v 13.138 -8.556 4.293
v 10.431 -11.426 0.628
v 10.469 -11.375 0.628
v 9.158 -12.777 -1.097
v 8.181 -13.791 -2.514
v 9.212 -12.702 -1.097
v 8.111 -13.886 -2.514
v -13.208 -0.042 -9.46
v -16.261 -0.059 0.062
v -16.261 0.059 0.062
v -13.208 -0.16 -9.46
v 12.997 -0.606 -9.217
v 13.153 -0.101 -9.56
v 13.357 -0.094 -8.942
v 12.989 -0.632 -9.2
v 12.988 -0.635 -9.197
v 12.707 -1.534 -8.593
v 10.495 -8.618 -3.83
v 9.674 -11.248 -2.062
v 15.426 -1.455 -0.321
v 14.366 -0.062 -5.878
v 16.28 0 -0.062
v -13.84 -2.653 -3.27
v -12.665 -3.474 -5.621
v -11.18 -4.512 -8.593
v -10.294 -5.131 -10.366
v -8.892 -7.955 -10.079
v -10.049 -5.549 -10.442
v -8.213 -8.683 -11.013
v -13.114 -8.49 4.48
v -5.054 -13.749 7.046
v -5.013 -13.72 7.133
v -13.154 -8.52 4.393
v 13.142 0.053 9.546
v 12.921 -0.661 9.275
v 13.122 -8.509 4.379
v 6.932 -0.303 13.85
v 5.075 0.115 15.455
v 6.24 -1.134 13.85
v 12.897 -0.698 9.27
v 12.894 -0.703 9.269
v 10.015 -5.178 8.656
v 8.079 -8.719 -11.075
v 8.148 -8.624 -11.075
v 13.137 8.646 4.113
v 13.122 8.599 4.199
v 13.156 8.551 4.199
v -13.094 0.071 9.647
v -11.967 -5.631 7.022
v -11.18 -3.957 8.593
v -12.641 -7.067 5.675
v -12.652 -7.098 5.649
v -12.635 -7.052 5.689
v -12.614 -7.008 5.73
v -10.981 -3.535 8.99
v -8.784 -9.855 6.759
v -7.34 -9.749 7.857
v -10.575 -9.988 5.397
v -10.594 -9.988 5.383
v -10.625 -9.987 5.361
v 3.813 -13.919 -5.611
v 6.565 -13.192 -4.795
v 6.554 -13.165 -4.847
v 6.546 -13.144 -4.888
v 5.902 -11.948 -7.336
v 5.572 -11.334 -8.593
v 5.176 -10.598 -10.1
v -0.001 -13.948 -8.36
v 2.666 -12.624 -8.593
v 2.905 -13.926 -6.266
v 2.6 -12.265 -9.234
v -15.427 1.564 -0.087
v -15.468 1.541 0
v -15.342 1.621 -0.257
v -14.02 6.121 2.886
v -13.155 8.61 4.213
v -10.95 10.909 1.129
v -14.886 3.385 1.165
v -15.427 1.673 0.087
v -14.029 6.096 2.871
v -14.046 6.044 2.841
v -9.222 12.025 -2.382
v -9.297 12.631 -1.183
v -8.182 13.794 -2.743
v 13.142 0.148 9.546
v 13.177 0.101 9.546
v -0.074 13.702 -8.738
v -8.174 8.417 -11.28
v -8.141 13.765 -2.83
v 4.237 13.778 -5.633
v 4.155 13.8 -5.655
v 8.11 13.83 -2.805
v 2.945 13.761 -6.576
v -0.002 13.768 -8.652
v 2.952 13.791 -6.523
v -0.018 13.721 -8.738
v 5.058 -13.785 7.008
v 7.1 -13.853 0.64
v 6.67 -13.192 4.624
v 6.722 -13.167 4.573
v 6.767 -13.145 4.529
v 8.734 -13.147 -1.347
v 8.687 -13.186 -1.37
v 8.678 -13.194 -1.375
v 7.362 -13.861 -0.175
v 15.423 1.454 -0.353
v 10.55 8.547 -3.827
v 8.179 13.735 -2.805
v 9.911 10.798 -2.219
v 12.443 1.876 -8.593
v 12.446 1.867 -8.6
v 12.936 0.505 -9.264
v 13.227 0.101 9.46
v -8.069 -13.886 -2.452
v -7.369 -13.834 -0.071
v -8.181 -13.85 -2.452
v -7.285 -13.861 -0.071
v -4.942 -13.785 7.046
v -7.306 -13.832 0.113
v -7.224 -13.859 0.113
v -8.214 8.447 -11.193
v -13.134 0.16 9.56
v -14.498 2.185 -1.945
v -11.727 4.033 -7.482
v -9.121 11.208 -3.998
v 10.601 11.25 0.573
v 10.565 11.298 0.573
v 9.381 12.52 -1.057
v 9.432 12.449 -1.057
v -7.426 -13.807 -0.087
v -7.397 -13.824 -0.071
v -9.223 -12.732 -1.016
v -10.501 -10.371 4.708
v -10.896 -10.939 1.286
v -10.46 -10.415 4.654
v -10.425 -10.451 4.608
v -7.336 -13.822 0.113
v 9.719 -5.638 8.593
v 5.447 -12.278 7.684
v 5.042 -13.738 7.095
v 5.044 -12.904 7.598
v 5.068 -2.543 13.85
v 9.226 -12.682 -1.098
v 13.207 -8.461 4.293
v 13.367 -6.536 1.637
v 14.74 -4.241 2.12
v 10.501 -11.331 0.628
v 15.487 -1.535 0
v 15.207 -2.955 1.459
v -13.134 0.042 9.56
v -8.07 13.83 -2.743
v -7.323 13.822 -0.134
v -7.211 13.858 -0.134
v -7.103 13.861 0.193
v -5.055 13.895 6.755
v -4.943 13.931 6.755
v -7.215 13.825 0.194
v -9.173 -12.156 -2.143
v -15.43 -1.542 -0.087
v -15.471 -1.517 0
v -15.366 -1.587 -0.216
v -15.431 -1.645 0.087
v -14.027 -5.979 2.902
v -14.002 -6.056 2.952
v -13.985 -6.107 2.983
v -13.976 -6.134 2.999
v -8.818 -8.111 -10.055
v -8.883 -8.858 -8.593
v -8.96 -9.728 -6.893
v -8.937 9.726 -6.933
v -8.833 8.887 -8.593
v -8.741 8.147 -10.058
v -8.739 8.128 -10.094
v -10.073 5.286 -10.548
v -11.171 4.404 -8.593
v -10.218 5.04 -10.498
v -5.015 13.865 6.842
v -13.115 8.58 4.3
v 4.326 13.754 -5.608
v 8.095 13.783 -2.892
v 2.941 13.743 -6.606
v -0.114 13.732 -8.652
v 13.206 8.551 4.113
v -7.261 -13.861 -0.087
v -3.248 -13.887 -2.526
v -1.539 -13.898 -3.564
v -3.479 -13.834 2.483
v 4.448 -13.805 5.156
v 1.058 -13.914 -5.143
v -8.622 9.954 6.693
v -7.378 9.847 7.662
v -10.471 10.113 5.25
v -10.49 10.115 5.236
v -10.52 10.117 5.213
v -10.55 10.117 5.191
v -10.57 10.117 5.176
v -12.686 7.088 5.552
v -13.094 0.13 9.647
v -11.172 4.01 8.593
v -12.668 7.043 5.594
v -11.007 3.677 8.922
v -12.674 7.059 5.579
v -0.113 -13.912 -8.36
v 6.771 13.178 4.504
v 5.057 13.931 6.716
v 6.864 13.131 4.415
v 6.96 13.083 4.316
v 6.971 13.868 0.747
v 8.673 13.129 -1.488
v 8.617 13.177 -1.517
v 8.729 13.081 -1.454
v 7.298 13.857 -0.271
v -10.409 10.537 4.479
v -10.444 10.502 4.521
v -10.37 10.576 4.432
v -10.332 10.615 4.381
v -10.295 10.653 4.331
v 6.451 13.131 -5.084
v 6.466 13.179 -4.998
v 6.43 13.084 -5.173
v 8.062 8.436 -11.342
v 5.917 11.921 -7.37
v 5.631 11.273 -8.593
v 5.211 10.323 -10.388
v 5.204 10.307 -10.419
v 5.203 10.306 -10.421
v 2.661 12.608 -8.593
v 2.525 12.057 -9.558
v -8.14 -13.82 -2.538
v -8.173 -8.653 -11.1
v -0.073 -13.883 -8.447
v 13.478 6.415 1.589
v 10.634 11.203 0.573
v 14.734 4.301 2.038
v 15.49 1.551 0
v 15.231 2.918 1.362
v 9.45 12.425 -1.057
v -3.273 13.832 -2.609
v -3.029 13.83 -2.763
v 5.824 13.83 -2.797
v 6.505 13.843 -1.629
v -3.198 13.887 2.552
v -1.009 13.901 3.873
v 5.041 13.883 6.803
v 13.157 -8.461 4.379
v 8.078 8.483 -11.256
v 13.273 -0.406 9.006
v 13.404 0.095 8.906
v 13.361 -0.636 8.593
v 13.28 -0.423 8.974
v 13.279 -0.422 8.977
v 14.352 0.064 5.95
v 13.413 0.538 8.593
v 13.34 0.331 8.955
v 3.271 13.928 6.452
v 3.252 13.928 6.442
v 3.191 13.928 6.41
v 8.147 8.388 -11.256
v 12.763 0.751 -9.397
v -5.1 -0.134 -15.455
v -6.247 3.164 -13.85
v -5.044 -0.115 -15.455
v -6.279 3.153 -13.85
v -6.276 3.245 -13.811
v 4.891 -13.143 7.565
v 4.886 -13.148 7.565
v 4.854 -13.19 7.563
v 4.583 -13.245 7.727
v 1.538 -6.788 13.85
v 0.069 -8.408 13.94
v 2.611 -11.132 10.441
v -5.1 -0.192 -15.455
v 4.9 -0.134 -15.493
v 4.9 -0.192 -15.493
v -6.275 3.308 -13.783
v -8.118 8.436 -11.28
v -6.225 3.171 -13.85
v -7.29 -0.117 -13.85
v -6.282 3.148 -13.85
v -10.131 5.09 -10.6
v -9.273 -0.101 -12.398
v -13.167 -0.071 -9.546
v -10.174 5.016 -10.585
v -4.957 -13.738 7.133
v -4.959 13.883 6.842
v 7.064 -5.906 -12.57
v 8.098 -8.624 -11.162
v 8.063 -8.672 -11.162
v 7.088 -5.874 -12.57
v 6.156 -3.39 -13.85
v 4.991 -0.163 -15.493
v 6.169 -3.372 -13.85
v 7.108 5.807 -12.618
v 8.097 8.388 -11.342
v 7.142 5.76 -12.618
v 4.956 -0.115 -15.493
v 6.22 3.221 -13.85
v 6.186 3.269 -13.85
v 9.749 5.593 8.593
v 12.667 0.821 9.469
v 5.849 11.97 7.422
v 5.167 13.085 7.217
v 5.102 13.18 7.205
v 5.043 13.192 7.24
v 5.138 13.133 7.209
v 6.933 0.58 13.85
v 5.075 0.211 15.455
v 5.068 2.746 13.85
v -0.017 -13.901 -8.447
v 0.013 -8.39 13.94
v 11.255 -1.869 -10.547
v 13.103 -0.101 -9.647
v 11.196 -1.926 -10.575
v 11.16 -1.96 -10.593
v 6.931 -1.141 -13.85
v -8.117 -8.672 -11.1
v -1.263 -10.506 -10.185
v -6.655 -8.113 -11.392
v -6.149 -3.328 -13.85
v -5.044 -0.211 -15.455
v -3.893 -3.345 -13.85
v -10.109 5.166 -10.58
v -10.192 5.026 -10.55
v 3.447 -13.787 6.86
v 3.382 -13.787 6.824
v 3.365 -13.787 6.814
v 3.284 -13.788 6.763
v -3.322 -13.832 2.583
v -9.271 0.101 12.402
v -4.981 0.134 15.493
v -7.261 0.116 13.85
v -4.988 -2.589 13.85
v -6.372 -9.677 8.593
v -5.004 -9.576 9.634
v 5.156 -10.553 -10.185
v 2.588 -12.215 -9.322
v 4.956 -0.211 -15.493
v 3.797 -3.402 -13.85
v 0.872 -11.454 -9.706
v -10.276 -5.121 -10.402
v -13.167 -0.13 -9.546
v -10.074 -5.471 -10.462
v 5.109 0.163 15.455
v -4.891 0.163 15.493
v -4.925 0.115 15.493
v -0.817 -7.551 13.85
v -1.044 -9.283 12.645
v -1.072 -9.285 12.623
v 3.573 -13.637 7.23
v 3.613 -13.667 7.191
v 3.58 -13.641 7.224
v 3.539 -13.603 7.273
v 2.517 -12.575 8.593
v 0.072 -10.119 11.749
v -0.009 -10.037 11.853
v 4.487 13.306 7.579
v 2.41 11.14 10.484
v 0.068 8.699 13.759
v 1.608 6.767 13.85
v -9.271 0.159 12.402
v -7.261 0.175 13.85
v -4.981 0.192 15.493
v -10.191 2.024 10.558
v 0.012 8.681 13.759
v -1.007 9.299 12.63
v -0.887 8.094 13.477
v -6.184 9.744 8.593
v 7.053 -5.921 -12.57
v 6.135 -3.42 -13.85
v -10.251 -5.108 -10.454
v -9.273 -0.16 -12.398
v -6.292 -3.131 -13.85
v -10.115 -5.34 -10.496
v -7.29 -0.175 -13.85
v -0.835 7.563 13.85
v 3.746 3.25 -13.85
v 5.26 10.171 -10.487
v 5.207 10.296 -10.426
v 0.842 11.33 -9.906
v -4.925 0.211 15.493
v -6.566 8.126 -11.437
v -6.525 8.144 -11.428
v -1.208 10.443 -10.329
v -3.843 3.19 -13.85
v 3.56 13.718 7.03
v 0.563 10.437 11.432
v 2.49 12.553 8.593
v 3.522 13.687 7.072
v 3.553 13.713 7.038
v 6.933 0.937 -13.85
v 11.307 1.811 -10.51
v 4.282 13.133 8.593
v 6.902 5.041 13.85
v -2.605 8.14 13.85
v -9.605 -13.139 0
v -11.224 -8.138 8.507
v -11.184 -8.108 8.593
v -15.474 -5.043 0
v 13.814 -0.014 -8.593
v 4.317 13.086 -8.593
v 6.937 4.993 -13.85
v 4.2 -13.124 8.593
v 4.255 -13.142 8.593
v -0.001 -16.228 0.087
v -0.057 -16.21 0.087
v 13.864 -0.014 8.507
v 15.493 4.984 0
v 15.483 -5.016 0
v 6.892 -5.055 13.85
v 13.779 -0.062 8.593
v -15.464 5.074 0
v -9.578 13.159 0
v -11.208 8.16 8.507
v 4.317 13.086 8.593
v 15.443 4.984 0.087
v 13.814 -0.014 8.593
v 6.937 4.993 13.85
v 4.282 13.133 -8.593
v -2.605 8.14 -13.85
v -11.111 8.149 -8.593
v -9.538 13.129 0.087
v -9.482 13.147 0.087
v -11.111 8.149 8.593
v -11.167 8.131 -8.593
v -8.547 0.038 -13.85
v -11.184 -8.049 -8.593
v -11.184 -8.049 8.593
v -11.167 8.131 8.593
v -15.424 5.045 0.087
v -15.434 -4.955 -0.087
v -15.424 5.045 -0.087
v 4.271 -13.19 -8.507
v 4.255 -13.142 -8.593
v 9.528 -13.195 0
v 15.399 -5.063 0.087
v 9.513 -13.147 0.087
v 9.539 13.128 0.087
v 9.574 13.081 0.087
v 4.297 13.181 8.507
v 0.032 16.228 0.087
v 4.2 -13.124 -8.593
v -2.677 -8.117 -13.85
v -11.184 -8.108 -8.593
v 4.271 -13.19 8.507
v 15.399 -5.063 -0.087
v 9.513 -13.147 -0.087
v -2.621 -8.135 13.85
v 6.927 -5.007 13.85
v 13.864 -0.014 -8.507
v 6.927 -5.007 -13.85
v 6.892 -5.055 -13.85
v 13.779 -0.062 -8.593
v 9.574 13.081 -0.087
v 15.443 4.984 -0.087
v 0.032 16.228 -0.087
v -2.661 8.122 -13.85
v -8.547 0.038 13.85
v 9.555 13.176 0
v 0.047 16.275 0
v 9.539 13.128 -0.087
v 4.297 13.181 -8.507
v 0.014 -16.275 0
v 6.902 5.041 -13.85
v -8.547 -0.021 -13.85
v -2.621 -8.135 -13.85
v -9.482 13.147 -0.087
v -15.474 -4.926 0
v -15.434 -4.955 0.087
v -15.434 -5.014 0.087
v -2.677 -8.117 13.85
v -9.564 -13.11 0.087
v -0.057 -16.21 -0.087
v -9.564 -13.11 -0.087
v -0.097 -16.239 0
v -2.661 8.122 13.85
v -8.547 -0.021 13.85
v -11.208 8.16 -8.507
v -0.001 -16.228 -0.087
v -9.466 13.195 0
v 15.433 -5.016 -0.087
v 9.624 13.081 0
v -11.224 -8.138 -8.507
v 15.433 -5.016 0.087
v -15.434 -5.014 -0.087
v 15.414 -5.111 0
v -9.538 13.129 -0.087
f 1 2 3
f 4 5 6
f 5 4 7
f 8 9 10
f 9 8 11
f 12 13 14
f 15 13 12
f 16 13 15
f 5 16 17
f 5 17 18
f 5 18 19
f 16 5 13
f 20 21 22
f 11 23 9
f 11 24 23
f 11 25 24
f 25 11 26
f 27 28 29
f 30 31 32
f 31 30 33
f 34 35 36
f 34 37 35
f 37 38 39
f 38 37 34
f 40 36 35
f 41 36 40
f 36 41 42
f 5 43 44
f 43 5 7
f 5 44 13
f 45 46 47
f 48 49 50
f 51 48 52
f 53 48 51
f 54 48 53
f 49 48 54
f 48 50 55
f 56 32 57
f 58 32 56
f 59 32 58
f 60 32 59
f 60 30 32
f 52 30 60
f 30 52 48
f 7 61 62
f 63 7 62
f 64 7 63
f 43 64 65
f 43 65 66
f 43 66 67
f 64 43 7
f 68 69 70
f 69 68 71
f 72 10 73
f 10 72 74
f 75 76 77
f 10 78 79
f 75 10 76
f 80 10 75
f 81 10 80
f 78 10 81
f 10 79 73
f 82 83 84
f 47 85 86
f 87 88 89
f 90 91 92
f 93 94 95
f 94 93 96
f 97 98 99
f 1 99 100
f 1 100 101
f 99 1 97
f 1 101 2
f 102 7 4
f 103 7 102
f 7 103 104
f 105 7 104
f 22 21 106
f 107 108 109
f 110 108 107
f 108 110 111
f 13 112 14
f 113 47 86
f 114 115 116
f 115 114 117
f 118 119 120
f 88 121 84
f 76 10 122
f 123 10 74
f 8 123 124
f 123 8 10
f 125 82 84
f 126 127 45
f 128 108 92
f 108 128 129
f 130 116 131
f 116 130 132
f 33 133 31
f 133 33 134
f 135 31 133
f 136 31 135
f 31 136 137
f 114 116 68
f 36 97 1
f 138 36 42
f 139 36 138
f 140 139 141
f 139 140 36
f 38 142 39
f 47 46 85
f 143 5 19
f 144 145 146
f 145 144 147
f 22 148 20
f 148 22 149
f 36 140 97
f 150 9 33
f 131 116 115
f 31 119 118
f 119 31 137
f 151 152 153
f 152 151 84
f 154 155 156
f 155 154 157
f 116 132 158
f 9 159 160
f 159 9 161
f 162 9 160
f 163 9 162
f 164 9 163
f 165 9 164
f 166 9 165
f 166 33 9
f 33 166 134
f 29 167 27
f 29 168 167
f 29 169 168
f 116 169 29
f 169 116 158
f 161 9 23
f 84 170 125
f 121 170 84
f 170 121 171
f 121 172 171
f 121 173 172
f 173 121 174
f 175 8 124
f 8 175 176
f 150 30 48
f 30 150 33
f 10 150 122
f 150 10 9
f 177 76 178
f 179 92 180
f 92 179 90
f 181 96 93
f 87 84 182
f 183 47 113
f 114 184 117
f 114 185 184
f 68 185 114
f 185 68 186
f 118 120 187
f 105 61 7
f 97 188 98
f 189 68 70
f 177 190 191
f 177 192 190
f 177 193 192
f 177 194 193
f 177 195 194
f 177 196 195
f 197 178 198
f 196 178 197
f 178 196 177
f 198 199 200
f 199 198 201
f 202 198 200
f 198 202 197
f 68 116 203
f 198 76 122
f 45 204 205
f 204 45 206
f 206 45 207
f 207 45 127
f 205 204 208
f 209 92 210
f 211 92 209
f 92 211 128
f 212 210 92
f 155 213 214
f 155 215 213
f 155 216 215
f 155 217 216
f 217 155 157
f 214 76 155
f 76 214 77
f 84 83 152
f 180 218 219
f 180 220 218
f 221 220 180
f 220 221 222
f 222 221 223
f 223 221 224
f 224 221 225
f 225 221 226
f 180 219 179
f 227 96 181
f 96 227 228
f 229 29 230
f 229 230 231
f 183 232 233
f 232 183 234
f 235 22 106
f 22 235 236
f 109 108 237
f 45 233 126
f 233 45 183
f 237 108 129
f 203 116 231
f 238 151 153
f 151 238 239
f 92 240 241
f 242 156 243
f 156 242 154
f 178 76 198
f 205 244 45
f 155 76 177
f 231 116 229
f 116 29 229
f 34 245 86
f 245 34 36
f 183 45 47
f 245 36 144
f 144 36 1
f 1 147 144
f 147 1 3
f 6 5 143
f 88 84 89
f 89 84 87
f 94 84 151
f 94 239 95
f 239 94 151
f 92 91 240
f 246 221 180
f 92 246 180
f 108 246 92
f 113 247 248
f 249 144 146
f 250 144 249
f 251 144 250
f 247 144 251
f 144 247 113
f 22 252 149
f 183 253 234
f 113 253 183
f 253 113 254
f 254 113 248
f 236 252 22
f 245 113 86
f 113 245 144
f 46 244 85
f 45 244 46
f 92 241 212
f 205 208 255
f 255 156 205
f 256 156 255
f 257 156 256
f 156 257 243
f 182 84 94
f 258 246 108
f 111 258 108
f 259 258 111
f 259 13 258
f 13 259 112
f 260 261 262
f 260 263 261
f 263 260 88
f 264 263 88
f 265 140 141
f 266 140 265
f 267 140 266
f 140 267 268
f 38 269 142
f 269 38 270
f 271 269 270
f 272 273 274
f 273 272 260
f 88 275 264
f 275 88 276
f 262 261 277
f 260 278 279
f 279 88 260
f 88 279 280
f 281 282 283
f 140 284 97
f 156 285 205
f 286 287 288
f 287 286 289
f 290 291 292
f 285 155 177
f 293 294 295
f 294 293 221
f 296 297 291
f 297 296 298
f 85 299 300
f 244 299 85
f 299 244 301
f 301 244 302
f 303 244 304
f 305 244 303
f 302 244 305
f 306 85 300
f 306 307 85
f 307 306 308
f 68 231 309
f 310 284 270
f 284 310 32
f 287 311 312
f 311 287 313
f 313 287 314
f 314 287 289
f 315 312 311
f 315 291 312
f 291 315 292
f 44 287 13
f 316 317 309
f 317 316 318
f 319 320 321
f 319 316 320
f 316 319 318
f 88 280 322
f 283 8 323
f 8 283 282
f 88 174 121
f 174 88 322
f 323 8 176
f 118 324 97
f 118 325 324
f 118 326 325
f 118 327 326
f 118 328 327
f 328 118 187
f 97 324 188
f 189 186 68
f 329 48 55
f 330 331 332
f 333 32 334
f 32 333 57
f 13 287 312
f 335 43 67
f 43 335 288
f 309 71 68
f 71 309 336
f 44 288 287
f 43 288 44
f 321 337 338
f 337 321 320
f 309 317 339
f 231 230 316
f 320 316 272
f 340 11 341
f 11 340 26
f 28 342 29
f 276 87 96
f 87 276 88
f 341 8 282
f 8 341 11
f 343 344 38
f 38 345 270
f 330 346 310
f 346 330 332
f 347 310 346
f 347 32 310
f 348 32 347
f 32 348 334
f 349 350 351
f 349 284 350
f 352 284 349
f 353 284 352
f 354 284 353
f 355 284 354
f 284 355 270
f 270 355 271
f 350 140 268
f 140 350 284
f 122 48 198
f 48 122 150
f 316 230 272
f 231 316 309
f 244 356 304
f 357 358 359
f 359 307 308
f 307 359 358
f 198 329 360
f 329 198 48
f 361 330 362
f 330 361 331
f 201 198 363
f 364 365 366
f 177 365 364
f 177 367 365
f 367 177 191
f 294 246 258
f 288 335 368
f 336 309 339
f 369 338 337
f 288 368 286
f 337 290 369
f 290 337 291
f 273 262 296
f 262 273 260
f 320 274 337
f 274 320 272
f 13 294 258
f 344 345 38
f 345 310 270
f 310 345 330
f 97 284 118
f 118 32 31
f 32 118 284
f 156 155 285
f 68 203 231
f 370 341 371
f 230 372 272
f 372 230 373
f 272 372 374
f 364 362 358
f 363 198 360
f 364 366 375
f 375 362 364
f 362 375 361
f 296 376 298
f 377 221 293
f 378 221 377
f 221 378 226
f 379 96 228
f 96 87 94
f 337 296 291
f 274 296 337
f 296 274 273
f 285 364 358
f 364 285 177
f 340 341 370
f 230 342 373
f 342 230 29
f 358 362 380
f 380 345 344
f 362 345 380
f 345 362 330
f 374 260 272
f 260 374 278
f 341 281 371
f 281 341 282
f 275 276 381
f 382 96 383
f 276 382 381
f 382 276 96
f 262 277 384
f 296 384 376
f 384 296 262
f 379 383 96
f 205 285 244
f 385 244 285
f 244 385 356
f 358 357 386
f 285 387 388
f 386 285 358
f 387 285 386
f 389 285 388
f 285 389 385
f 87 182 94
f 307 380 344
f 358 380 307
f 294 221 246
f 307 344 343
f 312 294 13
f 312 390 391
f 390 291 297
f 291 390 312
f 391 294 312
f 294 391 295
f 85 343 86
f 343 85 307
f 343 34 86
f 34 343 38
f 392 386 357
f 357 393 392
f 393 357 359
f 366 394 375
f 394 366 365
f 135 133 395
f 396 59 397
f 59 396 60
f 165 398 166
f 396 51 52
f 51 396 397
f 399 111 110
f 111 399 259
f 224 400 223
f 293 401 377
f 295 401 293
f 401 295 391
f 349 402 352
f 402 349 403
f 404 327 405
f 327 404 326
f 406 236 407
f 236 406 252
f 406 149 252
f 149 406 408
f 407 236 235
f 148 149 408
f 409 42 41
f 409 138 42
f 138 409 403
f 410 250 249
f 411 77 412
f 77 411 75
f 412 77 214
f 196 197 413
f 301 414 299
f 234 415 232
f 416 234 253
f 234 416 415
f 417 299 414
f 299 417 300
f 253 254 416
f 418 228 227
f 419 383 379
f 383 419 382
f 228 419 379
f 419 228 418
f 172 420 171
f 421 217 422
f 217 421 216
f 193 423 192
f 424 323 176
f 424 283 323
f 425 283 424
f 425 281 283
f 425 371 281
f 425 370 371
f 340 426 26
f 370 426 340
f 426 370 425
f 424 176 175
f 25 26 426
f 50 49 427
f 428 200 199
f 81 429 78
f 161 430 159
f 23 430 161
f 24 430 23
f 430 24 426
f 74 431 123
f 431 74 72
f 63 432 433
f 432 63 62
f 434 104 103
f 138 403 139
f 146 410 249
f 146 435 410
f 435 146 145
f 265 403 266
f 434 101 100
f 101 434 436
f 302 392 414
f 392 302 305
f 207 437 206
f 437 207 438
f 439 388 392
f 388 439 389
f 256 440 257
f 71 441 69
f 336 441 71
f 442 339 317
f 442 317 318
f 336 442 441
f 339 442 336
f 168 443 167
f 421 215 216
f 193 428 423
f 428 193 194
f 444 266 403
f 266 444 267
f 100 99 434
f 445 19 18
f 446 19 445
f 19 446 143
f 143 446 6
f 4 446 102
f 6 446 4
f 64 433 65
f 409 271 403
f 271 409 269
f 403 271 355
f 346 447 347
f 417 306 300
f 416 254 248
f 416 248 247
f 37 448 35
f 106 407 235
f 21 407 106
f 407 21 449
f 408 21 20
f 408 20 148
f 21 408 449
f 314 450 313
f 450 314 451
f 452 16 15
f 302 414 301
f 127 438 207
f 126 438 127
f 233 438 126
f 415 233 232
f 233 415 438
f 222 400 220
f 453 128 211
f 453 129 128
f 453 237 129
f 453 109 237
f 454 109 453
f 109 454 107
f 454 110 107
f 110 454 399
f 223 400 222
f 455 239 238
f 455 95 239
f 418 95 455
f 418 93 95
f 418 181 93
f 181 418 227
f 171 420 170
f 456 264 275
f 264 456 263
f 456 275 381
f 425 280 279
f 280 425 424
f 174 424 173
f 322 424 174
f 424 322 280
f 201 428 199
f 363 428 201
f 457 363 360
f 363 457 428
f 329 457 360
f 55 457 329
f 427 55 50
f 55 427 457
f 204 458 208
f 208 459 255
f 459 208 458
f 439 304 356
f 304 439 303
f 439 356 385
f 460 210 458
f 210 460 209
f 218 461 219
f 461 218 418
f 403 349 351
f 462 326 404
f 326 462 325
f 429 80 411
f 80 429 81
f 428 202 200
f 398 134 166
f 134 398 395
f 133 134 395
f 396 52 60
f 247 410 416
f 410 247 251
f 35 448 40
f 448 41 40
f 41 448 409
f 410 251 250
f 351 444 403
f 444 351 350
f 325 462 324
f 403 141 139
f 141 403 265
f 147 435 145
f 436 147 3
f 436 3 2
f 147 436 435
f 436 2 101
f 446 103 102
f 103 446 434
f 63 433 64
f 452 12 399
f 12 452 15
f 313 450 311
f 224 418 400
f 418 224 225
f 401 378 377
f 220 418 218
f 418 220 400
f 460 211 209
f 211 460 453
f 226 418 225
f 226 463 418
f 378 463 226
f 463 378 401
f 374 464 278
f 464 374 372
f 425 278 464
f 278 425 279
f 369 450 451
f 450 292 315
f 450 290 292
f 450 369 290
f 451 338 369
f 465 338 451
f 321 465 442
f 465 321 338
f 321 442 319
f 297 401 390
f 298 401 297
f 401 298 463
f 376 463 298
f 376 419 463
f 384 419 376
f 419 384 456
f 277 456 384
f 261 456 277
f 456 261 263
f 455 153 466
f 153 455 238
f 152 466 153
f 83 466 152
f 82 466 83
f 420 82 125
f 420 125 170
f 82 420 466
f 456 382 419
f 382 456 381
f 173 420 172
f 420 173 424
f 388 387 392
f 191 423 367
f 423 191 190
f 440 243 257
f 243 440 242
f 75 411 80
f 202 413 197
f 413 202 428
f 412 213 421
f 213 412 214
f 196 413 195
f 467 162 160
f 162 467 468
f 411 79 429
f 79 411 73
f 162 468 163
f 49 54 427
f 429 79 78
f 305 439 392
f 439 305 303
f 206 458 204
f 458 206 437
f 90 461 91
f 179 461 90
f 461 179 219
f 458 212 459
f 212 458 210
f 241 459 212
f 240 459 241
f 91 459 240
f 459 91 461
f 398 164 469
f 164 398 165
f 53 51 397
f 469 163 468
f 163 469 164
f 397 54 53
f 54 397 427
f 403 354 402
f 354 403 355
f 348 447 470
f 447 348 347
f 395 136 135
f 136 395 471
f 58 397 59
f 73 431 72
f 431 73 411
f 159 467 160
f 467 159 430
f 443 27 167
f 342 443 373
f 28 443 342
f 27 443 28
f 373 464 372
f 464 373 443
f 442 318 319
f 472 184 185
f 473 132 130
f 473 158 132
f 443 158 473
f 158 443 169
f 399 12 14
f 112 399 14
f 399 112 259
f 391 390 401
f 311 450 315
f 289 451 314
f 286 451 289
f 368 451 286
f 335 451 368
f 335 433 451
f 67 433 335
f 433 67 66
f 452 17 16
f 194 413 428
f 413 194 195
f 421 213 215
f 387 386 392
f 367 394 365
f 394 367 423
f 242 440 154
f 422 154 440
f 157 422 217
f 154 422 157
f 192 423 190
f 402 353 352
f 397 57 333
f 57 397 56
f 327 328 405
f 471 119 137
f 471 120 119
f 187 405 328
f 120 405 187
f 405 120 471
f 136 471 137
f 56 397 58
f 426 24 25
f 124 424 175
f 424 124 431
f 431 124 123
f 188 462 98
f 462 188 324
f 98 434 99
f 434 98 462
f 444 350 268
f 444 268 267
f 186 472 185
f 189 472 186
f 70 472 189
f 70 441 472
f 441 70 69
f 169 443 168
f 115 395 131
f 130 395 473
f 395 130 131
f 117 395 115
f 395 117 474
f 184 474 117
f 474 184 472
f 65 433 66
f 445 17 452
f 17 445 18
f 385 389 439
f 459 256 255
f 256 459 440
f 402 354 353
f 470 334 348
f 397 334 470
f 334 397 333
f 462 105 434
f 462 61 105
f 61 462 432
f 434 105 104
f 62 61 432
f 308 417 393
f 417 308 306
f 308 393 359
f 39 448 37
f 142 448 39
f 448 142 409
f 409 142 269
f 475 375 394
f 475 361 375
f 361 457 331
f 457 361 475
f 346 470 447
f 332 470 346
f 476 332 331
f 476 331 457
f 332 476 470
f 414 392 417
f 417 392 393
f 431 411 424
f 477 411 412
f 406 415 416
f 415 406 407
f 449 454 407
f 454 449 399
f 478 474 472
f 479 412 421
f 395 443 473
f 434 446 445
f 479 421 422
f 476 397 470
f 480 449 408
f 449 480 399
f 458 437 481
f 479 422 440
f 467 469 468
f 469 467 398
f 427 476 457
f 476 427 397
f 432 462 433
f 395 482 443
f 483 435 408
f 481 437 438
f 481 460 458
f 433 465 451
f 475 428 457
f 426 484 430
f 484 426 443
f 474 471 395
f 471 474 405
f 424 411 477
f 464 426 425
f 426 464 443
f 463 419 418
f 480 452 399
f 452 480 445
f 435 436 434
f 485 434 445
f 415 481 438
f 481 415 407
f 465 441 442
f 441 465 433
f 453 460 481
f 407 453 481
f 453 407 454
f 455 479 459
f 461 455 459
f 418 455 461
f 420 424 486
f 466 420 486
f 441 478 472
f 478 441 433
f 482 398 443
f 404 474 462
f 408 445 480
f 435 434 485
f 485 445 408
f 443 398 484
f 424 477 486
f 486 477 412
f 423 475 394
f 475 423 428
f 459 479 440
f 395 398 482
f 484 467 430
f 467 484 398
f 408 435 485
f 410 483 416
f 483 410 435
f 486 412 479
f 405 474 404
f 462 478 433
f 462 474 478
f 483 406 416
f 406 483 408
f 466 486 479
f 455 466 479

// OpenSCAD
// Auto-generated OpenSCAD file

    inner_points = 10*[[-0.0016418331039271756, -1.6180331557585443, -9.663416068995967e-15], [0.0016418331039271756, 1.6180331557585443, 9.663416068995967e-15], [-0.9523842975581269, -1.3080512751855748, 1.785566891566374e-13], [0.949727755792118, -1.3099813657560027, -1.9419242480370474e-13], [-0.949727755792118, 1.3099813657560027, 1.9419242480370474e-13], [0.9523842975581269, 1.3080512751855748, -1.785566891566374e-13], [-1.5393483306968156, -0.49843826651935746, 2.9857420804308504e-13], [1.5383336220347341, -0.5015612186636755, -3.045465276211565e-13], [-1.5383336220347341, 0.5015612186636755, 3.045465276211565e-13], [1.5393483306968156, 0.49843826651935746, -2.9857420804308504e-13], [-0.2636863372841518, -0.8087498459225672, -1.376381920471127], [-0.26368633728361235, -0.808749845922584, 1.3763819204712202], [-0.2620445041802246, 0.8092833098359772, -1.3763819204711172], [-0.26204450417968517, 0.8092833098359603, 1.37638192047123], [0.6876832516118934, -0.5006980559200255, -1.3763819204713112], [0.6876832516124327, -0.5006980559200425, 1.376381920471036], [0.6886979602739751, 0.49930142926300763, -1.3763819204713055], [0.6886979602745145, 0.49930142926299065, 1.3763819204710417], [-0.8506503704228404, 0.0008631627436501369, -1.3763819204710068], [-0.8506503704223011, 0.0008631627436331492, 1.3763819204713403], [0.4239969143281142, -1.3094479018426044, -0.850650808352131], [0.4239969143284476, -1.3094479018426148, 0.8506508083519487], [0.42665345609412314, 1.308584739098973, -0.8506508083521155], [0.42665345609445654, 1.3085847390989627, 0.8506508083519643], [-1.1143367077066197, -0.8078866831789286, -0.8506508083518266], [-1.1143367077062865, -0.8078866831789392, 0.8506508083522532], [-1.1126948746026926, 0.8101464725796157, -0.8506508083518168], [-1.1126948746023593, 0.8101464725796051, 0.8506508083522629], [1.376381211886241, -0.0013966266570295412, -0.8506508083523096], [1.3763812118865746, -0.0013966266570400404, 0.8506508083517702]];

    outer_points = 10*[[1.6180220198478508, 0.0, -0.006223506839090811], [-1.6180220198478508, 0.0, 0.006223506839090811], [1.3053494309833273, -0.010073202420207877, -0.9560310572227243], [1.3126651916762522, 0.010073202420207877, 0.9459612116278578], [-1.3126651916762522, -0.010073202420207877, -0.9459612116278578], [-1.3053494309833273, 0.010073202420207877, 0.9560310572227243], [0.4940777266785081, -0.016298783891454047, -1.5406672380477728], [0.5059148761332206, 0.016298783891454047, 1.5368208992919972], [-0.5059148761332206, -0.016298783891454047, -1.5368208992919972], [-0.4940777266785081, 0.016298783891454047, 1.5406672380477728], [0.8079439244447668, 1.3735205511194541, -0.28053858799672193], [0.8080560688782716, -1.3790888804671222, -0.2513826526847642], [-0.810078095403084, 1.3735205511194541, -0.27431508115763115], [-0.8099659509695791, -1.3790888804671222, -0.2451591458456734], [0.5025870962731682, 1.383593753539662, 0.6716461304702268], [0.5026992407066729, -1.3690156780469143, 0.7008020657821845], [-0.4974055065385606, 1.383593753539662, 0.6754924692260023], [-0.4972933621050558, -1.3690156780469143, 0.70464840453796], [-0.003327779860052472, 1.3672949696482082, -0.8651747688217704], [-0.0032156354265477157, -1.3853144619383682, -0.8360188335098125], [1.3106085106156622, 0.8551079663095562, 0.41125379828717096], [1.3106778196872173, -0.8460982201644762, 0.42927315728375415], [-1.3074061120439173, 0.8551079663095562, 0.4213236438820373], [-1.3073368029723622, -0.8460982201644762, 0.4393430028786205], [0.8046936344824416, 0.8388091824181022, -1.1255671010048263], [0.8047629435539967, -0.8623970040559302, -1.1075477420082434], [-0.8133283853654092, 0.8388091824181022, -1.1193435941657353], [-0.8132590762938541, -0.8623970040559302, -1.1013242351691523], [0.005259079632334848, 0.8651811687297641, 1.3672848555098953], [0.00532838870388989, -0.8360250177442683, 1.3853042145064782]];

    // Convex hull for inner set (I)
    module inner_hull() {
        hull() {
            for (p = inner_points) {
                translate(p) sphere(r=0.1);
            }
        }
    }

    // Convex hull for outer set (O) minus inner hull (O \ I)
    module outer_minus_inner() {
        difference() {
            hull() {
                for (p = outer_points) {
                    translate(p) sphere(r=0.1);
                }
            }
            inner_hull(); // Subtract inner hull
        }
    }

    // Convex hull for outer set (O) minus all translated inner hulls
    module outer_minus_AllTranslationInner() {
        difference() {
            hull() {
                for (p = outer_points) {
                    translate(p) sphere(r=0.1);
                }
            }
            hull() {
                translate([0,0,50]) inner_hull();
                translate([0,0,-50]) inner_hull();
            }; // Subtract translated inner hulls
        }
    }

    // Difference between outer_minus_inner and outer_minus_AllTranslationInner
    module outer_minus_inner_diff() {
        difference() {
            // Outer minus inner
            difference() {
                hull() {
                    for (p = outer_points) {
                        translate(p) sphere(r=0.1);
                    }
                }
                inner_hull();
            }

            // Subtract Outer minus AllTranslationInner
            difference() {
                hull() {
                    for (p = outer_points) {
                        translate(p) sphere(r=0.1);
                    }
                }
                hull() {
                    translate([0,0,50]) inner_hull();
                    translate([0,0,-50]) inner_hull();
                };
            }
        }
    }

    // Rendering all with colors applied
    color([1, 0, 0, 0.5]) inner_hull(); // Transparent red
    color([0, 1, 0, 1]) outer_minus_AllTranslationInner(); // Opaque green
    color([1, 1, 0, 1]) outer_minus_inner_diff(); // Opaque yellow
    
